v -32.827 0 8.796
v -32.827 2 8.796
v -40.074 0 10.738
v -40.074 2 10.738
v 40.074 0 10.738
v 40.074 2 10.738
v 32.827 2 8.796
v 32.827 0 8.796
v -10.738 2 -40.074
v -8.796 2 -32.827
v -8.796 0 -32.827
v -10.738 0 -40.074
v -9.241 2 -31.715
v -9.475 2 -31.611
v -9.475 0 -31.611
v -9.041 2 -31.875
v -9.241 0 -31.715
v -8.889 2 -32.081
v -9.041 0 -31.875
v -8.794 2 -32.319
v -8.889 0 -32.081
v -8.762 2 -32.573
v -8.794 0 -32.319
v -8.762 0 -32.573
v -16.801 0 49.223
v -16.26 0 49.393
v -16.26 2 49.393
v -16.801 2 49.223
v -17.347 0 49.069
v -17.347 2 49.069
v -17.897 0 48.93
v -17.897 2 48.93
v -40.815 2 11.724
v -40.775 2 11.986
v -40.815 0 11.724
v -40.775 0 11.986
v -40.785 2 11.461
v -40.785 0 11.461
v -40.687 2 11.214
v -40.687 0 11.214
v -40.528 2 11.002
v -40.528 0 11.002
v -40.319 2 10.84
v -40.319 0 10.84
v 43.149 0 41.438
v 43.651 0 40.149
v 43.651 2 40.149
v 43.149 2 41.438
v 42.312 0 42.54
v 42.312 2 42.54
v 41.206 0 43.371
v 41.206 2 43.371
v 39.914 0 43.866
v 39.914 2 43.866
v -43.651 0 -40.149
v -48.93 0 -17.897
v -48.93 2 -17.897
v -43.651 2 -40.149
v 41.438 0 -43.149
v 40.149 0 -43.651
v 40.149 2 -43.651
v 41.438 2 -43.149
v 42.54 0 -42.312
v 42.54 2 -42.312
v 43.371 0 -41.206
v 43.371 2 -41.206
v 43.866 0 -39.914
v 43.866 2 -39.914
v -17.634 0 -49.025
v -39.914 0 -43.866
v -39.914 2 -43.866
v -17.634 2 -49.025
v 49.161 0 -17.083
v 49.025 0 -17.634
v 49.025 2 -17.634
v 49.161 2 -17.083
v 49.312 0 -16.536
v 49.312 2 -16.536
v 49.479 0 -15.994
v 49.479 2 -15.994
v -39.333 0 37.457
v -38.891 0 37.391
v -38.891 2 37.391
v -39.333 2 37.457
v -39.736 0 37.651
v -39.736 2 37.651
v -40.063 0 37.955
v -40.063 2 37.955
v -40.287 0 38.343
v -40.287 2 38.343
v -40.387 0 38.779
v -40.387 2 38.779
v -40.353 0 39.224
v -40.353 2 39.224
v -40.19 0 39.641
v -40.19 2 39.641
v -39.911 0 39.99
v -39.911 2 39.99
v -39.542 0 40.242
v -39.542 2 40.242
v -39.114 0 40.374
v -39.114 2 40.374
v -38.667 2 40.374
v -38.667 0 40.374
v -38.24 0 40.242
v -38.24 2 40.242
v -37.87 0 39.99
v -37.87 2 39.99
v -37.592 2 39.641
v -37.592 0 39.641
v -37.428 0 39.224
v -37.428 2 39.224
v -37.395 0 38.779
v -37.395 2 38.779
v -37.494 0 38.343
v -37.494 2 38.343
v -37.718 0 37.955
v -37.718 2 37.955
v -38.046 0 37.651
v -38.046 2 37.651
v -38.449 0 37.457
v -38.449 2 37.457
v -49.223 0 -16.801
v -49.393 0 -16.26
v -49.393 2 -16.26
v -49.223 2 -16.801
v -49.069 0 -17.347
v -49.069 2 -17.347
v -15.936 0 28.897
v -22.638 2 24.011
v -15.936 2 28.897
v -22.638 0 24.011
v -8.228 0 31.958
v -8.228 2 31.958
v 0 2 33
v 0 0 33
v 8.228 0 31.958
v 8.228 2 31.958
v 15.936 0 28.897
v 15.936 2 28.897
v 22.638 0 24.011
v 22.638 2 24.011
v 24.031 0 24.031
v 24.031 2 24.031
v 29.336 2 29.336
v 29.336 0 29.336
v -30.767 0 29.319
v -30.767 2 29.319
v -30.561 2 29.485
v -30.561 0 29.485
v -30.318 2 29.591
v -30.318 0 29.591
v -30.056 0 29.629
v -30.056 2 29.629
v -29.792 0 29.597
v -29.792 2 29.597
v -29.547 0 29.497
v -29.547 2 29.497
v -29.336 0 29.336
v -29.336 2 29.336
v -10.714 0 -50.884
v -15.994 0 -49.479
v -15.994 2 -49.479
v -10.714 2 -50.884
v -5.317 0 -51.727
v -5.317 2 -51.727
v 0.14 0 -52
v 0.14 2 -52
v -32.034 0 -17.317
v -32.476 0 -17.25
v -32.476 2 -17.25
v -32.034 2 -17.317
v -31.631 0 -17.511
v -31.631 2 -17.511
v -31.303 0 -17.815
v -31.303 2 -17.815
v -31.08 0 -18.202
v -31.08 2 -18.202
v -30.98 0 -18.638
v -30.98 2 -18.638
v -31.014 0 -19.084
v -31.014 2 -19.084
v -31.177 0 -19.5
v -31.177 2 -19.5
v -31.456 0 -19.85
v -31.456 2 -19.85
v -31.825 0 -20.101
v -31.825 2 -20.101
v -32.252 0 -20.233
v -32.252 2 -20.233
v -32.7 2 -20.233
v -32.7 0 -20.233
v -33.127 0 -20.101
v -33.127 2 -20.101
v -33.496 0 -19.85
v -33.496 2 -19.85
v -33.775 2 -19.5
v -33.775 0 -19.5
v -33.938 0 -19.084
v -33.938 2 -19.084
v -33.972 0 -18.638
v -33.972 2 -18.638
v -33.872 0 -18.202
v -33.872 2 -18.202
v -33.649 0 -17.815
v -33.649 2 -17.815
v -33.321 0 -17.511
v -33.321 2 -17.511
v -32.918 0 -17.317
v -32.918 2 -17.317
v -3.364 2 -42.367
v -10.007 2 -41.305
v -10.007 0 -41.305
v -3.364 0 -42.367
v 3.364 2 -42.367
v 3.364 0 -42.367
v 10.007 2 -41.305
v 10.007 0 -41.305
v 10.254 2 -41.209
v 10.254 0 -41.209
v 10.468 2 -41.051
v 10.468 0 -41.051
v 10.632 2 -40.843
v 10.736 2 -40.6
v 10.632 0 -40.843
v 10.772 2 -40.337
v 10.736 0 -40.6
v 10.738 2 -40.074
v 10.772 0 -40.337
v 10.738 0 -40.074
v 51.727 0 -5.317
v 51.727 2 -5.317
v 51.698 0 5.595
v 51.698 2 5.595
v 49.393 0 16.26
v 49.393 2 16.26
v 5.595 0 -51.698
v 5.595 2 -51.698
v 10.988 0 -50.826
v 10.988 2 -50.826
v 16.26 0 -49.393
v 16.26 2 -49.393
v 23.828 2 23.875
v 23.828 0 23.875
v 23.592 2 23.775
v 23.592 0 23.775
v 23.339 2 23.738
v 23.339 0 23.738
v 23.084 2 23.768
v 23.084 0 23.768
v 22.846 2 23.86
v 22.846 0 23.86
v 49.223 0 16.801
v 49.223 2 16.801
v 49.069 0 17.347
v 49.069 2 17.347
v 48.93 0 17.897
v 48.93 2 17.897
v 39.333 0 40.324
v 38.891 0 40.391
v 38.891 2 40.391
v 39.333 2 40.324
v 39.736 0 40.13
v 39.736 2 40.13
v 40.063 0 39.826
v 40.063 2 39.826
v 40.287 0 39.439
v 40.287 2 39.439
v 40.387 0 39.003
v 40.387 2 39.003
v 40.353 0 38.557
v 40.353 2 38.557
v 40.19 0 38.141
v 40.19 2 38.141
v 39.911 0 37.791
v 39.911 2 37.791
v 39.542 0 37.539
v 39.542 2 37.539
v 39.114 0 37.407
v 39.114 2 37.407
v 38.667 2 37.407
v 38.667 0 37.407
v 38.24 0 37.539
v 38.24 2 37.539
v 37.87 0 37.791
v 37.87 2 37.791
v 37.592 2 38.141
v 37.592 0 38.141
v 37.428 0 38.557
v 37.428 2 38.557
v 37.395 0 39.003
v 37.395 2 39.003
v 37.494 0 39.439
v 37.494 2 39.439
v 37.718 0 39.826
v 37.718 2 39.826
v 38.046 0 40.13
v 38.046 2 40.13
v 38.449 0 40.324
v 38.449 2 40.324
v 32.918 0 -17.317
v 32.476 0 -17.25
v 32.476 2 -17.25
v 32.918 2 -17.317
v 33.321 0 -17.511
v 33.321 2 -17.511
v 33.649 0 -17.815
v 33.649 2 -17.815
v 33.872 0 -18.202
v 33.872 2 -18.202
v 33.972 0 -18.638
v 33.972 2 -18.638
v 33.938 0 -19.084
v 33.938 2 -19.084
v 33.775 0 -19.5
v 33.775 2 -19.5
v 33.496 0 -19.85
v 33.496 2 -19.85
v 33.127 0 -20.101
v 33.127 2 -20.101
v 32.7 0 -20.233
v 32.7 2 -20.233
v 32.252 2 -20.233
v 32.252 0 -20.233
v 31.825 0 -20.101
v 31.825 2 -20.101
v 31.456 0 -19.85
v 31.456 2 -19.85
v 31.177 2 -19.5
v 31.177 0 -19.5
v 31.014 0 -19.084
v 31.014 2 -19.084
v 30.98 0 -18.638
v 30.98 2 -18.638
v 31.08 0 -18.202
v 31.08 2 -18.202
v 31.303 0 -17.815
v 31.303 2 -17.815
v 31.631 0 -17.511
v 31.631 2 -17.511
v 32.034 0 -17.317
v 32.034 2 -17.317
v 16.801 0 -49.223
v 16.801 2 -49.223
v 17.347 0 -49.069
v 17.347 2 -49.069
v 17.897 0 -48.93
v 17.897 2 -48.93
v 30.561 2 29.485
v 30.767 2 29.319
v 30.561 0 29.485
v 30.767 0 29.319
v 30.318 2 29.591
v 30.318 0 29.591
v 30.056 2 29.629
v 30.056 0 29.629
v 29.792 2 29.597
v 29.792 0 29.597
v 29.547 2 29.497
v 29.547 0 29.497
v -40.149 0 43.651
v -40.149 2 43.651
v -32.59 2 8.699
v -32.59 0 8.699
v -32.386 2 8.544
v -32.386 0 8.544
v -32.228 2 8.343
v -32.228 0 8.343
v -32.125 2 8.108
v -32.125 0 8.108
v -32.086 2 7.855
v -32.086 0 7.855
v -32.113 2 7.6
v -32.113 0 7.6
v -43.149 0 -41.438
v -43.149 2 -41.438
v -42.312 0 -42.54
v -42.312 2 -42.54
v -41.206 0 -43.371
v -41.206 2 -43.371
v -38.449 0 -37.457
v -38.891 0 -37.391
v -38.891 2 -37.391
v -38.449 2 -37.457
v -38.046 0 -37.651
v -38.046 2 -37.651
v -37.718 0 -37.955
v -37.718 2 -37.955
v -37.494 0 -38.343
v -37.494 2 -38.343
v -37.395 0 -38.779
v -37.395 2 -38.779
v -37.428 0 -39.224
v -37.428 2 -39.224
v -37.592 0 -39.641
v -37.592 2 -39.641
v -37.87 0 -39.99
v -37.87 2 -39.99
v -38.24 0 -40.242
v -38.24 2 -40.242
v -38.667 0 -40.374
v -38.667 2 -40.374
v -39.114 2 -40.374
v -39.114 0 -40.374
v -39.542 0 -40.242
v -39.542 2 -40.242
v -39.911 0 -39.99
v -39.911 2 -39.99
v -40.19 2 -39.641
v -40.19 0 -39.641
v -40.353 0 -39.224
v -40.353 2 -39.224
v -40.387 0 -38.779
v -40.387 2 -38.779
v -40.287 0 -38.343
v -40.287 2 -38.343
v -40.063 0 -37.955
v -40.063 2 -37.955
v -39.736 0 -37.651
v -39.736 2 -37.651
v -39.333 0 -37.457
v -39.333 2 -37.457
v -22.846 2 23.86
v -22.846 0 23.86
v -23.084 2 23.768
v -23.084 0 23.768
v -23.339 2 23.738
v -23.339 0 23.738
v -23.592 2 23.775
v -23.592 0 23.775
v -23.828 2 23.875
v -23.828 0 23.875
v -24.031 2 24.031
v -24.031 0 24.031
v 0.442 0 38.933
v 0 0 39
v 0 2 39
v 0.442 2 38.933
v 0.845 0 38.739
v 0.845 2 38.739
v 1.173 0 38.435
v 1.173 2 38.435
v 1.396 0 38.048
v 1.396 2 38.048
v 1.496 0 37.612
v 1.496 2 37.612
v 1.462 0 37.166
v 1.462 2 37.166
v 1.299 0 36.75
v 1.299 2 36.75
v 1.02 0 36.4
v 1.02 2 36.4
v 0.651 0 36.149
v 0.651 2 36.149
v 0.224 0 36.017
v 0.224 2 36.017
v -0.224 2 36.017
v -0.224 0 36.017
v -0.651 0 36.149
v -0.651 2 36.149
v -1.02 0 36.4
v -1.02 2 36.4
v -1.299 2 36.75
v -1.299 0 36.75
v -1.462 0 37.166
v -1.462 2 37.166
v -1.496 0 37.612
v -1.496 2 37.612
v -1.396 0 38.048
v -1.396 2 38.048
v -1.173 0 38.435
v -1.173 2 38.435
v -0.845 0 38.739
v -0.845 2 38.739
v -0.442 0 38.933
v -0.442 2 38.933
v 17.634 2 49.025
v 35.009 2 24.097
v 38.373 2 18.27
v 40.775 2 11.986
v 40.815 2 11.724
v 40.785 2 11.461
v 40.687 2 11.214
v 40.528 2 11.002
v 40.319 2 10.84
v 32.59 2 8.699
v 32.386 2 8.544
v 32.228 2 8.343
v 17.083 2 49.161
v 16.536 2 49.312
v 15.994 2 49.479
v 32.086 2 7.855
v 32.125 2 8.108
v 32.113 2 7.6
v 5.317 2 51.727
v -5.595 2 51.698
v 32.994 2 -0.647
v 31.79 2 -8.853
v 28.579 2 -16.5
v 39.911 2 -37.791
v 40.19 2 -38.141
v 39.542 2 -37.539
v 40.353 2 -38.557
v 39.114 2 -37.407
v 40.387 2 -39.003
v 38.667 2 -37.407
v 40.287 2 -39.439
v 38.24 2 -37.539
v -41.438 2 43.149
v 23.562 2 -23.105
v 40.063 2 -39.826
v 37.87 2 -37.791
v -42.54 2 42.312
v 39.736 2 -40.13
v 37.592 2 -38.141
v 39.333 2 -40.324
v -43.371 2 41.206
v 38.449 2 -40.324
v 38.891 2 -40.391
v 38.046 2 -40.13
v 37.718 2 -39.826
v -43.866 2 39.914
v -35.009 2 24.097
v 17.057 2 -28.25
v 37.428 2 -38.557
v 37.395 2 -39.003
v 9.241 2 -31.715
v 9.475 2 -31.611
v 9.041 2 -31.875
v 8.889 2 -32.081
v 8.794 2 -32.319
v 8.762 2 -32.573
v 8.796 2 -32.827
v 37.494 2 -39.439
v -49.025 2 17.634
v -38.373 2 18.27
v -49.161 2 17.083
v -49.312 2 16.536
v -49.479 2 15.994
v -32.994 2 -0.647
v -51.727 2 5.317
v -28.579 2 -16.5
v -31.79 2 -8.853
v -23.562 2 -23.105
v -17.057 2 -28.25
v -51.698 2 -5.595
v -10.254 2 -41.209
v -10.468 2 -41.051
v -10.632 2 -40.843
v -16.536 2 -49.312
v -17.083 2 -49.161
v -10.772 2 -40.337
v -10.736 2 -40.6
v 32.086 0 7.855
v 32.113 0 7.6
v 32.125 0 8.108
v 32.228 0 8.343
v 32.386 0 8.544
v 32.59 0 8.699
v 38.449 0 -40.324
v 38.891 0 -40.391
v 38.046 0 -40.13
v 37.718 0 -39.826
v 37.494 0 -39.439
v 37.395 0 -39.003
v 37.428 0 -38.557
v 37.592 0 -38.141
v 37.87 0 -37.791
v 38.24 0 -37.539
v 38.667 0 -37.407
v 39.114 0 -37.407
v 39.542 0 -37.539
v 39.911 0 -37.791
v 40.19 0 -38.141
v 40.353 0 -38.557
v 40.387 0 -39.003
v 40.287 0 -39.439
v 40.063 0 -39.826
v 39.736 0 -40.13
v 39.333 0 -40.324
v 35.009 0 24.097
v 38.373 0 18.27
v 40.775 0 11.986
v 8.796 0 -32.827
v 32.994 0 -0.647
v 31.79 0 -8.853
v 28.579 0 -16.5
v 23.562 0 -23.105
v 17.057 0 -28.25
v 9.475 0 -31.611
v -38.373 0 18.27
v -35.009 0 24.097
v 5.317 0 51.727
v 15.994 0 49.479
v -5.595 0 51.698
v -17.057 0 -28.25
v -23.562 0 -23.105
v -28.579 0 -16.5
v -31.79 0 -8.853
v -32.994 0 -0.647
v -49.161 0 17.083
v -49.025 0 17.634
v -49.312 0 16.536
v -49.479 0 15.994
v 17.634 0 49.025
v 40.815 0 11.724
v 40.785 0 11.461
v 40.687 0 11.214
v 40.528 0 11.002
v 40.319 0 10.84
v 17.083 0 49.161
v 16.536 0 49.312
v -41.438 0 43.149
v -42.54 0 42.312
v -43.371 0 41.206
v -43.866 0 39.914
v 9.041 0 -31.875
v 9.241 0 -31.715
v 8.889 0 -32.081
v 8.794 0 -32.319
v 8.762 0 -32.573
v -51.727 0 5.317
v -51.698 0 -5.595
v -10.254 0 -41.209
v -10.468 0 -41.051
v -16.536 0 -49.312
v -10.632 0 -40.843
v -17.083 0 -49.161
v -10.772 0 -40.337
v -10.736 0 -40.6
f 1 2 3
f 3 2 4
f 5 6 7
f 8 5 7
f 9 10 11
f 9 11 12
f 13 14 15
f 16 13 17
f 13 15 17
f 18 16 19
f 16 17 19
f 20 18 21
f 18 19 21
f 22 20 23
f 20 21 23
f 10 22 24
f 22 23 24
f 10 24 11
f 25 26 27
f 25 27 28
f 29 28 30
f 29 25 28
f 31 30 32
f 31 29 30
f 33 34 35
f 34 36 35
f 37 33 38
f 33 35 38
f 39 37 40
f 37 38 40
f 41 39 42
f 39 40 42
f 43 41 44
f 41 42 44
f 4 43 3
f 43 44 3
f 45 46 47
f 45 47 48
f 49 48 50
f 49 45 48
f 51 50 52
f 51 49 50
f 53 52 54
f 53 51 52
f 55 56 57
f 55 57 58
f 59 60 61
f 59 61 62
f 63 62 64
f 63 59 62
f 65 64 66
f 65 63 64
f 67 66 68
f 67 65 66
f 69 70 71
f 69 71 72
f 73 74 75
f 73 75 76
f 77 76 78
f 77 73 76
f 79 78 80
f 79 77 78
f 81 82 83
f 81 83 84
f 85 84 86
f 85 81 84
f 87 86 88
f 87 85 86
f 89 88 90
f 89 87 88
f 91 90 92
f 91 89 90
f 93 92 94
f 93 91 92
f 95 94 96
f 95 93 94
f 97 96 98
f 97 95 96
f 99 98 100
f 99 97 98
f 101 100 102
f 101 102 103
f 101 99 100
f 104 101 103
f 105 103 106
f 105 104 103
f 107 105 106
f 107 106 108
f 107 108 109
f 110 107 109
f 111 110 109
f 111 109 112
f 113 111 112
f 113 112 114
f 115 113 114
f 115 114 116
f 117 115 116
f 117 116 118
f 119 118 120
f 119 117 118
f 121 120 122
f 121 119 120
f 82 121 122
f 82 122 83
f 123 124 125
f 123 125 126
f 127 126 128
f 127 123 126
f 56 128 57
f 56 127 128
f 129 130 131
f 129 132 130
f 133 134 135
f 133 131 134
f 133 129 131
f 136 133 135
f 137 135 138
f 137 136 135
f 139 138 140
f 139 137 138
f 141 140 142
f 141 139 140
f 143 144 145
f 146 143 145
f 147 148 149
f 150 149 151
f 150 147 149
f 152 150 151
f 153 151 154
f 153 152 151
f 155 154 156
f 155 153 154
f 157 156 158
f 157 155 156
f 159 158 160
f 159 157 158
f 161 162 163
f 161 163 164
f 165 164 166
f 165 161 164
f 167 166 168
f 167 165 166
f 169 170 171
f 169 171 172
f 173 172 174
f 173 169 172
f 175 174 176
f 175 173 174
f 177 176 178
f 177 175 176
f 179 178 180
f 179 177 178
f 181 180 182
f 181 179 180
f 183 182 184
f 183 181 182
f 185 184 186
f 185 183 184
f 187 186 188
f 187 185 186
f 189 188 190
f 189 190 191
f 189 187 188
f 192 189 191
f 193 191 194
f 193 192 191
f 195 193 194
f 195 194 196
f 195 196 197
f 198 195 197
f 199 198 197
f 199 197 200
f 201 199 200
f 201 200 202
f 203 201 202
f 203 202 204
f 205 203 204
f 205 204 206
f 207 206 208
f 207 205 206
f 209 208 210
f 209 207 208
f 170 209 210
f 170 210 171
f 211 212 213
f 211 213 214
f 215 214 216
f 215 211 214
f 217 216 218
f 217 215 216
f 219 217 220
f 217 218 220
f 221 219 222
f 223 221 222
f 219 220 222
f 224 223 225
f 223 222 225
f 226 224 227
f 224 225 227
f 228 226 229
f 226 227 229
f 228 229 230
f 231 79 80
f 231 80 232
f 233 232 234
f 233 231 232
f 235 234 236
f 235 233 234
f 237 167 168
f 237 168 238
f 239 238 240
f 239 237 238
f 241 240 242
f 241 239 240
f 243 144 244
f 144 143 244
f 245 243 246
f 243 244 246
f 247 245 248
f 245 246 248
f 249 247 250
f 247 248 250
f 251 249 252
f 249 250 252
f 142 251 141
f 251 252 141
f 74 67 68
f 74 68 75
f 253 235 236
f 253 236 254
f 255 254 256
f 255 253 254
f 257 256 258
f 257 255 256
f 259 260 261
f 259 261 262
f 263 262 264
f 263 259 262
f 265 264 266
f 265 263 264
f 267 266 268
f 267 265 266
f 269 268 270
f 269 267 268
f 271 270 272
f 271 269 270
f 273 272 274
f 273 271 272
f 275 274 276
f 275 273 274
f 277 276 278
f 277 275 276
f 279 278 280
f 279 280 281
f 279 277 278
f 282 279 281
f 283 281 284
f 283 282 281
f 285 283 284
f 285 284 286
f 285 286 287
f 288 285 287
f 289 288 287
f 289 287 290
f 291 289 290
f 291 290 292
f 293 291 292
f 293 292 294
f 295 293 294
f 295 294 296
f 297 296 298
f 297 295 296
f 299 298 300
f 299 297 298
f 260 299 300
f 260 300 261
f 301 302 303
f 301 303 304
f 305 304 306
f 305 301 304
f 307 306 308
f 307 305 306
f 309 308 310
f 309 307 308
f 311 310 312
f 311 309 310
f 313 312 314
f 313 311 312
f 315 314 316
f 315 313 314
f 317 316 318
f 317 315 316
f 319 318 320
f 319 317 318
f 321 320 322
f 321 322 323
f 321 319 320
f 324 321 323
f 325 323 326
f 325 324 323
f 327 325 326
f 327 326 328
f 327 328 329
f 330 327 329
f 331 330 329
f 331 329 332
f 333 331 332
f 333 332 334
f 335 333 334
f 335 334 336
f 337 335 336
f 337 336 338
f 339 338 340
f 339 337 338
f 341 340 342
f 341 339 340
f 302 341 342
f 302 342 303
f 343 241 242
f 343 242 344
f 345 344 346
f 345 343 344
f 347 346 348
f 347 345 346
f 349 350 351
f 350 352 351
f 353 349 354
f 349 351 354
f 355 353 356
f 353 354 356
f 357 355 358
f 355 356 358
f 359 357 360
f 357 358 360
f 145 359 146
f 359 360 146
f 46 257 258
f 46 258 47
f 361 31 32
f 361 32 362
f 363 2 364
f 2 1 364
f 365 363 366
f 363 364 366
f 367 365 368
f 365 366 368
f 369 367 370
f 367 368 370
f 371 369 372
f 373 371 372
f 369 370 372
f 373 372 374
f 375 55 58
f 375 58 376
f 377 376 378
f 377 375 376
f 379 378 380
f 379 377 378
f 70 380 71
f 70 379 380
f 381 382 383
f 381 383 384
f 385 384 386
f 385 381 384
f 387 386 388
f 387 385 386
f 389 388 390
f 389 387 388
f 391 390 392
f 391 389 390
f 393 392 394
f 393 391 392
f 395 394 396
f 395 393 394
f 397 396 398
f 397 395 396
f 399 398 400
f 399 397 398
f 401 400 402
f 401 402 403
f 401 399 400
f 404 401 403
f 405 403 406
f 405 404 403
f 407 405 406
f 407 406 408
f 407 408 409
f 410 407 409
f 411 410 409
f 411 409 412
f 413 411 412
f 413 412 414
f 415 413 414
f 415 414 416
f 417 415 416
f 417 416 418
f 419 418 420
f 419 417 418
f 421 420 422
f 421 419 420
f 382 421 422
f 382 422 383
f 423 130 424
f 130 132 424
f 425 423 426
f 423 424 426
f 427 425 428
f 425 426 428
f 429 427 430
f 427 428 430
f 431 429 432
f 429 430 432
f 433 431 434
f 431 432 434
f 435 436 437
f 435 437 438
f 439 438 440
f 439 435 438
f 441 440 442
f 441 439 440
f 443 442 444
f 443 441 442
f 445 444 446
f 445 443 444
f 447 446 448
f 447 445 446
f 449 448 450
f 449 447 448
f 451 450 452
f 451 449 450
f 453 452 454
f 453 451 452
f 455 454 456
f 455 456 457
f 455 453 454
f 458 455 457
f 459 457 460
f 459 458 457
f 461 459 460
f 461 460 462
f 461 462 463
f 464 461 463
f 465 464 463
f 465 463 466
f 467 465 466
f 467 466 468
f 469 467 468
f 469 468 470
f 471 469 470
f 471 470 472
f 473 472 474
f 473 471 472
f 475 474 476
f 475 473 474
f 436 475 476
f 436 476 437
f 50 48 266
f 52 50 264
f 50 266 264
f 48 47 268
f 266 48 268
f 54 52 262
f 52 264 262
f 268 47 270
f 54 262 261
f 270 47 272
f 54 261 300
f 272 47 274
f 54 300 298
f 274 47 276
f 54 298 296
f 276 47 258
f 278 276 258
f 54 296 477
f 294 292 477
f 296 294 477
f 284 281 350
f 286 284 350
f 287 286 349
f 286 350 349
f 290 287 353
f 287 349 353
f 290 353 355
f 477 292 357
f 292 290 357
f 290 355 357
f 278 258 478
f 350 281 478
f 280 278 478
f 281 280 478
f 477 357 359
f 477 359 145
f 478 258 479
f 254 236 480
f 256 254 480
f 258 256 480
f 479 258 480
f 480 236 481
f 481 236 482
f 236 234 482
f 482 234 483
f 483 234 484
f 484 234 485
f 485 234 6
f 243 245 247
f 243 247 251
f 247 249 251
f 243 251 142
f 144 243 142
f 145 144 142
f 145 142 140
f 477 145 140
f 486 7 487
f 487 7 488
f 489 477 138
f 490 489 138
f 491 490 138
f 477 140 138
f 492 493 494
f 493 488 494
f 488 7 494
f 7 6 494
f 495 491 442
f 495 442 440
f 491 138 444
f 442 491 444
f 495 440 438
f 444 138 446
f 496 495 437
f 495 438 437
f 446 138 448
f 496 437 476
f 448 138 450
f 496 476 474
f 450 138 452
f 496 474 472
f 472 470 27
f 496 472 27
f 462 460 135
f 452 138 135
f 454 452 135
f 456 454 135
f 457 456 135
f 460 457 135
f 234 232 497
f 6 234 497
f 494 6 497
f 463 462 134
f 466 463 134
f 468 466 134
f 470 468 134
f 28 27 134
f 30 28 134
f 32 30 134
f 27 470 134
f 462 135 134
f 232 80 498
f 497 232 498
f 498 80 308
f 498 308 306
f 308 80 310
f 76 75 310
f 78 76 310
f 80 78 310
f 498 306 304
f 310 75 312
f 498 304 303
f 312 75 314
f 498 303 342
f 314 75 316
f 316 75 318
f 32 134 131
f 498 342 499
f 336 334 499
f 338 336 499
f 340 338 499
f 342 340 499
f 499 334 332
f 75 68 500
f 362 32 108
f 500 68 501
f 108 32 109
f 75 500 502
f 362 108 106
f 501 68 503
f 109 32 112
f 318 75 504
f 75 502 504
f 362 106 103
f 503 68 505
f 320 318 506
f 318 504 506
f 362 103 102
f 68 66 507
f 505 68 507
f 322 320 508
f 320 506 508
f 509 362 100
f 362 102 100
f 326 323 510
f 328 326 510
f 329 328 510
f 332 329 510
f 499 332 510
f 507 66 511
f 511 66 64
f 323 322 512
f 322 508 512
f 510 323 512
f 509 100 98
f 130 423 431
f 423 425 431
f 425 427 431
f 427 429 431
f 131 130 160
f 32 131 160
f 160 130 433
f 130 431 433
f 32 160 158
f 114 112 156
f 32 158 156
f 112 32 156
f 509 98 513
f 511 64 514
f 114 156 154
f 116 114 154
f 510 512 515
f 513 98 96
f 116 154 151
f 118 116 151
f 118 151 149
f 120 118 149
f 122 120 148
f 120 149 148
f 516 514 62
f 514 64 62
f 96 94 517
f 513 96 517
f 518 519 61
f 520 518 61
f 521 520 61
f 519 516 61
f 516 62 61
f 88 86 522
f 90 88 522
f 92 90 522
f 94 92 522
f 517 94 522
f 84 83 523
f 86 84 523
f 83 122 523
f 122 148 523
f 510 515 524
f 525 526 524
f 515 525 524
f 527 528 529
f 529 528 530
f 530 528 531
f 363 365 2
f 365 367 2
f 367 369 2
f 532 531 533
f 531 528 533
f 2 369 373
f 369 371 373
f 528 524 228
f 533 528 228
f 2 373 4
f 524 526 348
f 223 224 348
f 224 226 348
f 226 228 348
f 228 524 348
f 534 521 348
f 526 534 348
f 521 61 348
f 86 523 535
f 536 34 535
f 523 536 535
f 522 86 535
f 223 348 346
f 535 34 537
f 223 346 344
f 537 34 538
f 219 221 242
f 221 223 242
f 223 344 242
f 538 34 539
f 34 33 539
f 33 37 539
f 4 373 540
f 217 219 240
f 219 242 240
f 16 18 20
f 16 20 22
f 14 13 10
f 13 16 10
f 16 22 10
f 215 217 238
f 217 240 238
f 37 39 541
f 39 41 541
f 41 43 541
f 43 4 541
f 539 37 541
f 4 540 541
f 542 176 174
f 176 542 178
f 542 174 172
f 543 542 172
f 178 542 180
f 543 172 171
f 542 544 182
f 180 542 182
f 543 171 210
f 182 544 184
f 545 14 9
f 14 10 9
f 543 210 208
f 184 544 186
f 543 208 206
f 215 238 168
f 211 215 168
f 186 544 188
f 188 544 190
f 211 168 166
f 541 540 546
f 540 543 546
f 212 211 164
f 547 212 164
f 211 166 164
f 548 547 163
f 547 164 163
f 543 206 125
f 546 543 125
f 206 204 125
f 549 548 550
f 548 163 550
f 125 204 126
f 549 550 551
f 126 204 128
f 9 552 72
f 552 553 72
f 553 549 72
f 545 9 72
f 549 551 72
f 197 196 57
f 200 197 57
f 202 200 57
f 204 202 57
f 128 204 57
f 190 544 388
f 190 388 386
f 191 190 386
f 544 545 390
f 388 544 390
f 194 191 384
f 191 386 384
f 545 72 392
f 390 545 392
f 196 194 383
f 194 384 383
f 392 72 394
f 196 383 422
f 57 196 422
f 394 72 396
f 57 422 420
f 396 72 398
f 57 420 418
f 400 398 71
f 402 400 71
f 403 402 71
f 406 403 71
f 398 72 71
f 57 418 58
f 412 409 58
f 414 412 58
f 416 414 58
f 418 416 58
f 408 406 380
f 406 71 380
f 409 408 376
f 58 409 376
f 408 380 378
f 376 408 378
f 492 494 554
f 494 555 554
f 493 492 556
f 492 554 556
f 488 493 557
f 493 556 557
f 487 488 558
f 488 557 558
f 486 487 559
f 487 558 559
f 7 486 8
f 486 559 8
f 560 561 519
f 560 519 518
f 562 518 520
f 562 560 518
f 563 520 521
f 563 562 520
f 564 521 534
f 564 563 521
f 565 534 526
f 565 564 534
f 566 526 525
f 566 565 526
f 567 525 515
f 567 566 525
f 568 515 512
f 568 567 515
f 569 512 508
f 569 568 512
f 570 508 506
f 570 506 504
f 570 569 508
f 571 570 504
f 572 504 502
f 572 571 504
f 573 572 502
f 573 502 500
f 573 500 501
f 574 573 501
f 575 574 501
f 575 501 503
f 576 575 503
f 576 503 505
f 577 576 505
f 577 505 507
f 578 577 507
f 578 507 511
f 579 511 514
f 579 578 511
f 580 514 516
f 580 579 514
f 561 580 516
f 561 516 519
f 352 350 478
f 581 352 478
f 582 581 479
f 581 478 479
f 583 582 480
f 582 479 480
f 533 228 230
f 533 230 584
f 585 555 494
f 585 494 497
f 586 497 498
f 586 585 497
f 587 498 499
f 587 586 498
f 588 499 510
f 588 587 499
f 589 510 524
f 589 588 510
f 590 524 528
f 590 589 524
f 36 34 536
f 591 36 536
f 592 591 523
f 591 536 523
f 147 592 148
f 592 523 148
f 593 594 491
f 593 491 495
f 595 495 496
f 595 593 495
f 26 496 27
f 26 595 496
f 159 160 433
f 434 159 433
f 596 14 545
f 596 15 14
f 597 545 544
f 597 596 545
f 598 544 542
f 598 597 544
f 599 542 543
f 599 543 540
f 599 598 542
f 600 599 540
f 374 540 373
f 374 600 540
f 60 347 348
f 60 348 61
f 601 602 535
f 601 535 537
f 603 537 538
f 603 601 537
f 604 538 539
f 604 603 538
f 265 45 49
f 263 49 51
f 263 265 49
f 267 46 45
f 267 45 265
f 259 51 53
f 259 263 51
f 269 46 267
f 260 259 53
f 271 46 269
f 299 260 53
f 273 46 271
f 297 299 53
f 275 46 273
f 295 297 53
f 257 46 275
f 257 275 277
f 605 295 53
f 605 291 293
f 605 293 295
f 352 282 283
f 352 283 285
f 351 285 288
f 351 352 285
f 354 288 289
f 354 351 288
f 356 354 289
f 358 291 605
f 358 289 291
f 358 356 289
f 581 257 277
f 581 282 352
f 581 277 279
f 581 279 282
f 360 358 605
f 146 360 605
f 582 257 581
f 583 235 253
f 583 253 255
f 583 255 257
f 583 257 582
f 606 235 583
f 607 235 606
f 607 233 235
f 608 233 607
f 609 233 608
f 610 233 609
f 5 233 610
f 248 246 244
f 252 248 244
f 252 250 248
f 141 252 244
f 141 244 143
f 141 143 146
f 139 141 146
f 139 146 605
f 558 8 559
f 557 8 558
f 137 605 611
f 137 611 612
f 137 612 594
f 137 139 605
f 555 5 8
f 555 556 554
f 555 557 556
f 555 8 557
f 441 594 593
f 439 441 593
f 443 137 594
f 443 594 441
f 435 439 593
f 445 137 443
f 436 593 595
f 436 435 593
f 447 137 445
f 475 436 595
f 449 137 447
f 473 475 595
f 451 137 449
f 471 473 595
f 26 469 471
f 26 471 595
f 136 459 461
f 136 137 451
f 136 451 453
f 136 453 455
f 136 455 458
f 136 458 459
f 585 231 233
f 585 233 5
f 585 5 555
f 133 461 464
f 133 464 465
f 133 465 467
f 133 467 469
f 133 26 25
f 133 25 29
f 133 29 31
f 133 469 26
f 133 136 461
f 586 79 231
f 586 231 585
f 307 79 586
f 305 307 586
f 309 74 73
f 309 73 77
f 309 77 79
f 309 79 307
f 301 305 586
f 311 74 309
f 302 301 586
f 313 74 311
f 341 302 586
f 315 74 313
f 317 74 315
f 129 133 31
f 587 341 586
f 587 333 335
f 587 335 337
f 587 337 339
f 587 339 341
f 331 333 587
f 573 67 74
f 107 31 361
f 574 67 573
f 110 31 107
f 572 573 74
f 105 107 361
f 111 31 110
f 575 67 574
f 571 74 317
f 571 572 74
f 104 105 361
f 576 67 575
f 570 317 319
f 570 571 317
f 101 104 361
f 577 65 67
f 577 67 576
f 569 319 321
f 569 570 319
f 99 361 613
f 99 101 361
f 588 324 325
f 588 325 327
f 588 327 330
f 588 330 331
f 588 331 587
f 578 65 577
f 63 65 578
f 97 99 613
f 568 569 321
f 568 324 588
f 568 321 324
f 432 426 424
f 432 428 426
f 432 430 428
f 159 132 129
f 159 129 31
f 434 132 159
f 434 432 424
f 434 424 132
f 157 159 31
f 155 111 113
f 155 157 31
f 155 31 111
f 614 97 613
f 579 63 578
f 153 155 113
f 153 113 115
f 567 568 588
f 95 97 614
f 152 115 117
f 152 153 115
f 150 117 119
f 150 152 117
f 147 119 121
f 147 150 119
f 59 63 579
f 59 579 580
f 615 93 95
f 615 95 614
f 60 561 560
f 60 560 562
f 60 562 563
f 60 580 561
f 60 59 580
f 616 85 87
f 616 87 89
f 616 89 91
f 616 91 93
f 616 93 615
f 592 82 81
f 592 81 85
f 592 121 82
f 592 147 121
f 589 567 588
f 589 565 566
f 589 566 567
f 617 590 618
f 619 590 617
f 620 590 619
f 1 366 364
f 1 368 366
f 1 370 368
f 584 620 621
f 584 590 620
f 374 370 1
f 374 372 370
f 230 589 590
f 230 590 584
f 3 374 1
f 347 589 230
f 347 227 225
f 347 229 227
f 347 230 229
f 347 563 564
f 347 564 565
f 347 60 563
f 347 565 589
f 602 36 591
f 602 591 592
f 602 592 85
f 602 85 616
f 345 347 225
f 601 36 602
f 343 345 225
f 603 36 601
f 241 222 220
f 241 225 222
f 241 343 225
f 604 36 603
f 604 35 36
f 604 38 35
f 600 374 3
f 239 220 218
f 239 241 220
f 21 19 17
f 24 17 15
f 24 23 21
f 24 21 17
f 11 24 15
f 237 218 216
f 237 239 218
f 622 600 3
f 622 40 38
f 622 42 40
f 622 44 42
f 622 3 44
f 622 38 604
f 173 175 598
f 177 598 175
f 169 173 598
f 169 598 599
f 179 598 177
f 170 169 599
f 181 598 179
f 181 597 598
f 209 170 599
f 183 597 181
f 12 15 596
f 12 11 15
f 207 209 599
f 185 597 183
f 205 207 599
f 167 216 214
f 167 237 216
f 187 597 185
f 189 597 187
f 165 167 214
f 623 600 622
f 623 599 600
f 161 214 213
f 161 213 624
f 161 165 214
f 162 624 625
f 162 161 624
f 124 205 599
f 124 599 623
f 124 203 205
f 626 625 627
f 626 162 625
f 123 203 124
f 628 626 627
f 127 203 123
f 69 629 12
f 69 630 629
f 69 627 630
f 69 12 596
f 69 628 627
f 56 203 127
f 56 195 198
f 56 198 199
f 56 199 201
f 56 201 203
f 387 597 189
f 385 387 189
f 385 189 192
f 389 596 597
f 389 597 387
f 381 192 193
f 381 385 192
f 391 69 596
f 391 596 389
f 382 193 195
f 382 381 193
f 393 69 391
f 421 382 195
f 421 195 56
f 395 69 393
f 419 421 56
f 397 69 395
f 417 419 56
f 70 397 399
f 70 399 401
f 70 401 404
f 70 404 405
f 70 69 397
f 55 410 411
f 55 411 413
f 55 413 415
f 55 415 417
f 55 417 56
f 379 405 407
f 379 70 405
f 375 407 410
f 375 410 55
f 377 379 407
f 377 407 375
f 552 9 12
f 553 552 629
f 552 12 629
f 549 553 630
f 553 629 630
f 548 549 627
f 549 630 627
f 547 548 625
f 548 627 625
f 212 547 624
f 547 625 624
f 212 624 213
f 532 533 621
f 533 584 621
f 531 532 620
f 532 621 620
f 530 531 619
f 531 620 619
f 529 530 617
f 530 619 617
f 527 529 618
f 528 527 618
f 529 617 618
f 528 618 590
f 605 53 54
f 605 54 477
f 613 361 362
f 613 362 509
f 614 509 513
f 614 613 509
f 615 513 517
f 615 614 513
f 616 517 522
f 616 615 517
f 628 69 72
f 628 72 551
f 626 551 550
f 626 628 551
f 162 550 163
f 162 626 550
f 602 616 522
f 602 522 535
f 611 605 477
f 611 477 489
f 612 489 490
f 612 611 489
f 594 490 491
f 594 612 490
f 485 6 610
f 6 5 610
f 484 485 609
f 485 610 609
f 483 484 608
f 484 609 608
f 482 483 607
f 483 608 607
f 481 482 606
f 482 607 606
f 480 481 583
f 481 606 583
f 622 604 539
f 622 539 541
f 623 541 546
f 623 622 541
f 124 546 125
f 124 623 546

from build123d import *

# Parameters (mm, degrees)
SKETCH1_R           = 1.5
SKETCH1_R_2         = 33
BOSS_EXTRUDE1_DEPTH = 2
CUT_EXTRUDE1_DEPTH  = 74.566296631
FILLET1_R           = 1


with BuildPart() as part:
    # Sketch1 → Boss-Extrude1 (new body)
    with BuildSketch(Plane(origin=(0, 0, 0), x_dir=(1, 0, 0), z_dir=(0, 1, 0))):
        with BuildLine():
            Line((17.897079586, 48.929734976), (40.149284407, 43.651218265))
            ThreePointArc((40.149284407, 43.651218265), (42.540265174, 42.312242187), (43.866371506, 39.91409958))
            Line((43.866371506, 39.91409958), (49.02521675, 17.633846579))
            ThreePointArc((49.02521675, 17.633846579), (49.23478351, 16.809026698), (49.479249782, 15.993868858))
            ThreePointArc((49.479249782, 15.993868858), (51.999812242, -0.139738387), (49.392575566, -16.259565766))
            ThreePointArc((49.392575566, -16.259565766), (49.143731732, -17.073397941), (48.929734976, -17.897079586))
            Line((48.929734976, -17.897079586), (43.651218265, -40.149284407))
            ThreePointArc((43.651218265, -40.149284407), (42.312242187, -42.540265174), (39.91409958, -43.866371506))
            Line((39.91409958, -43.866371506), (17.633846579, -49.02521675))
            ThreePointArc((17.633846579, -49.02521675), (16.809026698, -49.23478351), (15.993868858, -49.479249782))
            ThreePointArc((15.993868858, -49.479249782), (-0.139738387, -51.999812242), (-16.259565766, -49.392575566))
            ThreePointArc((-16.259565766, -49.392575566), (-17.073397941, -49.143731732), (-17.897079586, -48.929734976))
            Line((-17.897079586, -48.929734976), (-40.149284407, -43.651218265))
            ThreePointArc((-40.149284407, -43.651218265), (-42.540265174, -42.312242187), (-43.866371506, -39.91409958))
            Line((-43.866371506, -39.91409958), (-49.02521675, -17.633846579))
            ThreePointArc((-49.02521675, -17.633846579), (-49.23478351, -16.809026698), (-49.479249782, -15.993868858))
            ThreePointArc((-49.479249782, -15.993868858), (-51.999812242, 0.139738387), (-49.392575566, 16.259565766))
            ThreePointArc((-49.392575566, 16.259565766), (-49.143731732, 17.073397941), (-48.929734976, 17.897079586))
            Line((-48.929734976, 17.897079586), (-43.651218265, 40.149284407))
            ThreePointArc((-43.651218265, 40.149284407), (-42.312242187, 42.540265174), (-39.91409958, 43.866371506))
            Line((-39.91409958, 43.866371506), (-17.633846579, 49.02521675))
            ThreePointArc((-17.633846579, 49.02521675), (-16.809026698, 49.23478351), (-15.993868858, 49.479249782))
            ThreePointArc((-15.993868858, 49.479249782), (-8.026622704, 51.3767781), (0.139738387, 51.999812242))
            ThreePointArc((0.139738387, 51.999812242), (8.302633013, 51.332896714), (16.259565766, 49.392575566))
            ThreePointArc((16.259565766, 49.392575566), (17.073397941, 49.143731732), (17.897079586, 48.929734976))
        make_face()
        with Locations(Location((-38.8907, 38.8907, 0), (0, 0, 270))):
            Circle(SKETCH1_R, mode=Mode.SUBTRACT)
        with Locations(Location((38.8907, 38.8907, 0), (0, 0, 90))):
            Circle(SKETCH1_R, mode=Mode.SUBTRACT)
        with Locations(Location((38.8907, -38.8907, 0), (0, 0, 270))):
            Circle(SKETCH1_R, mode=Mode.SUBTRACT)
        with Locations(Location((-38.8907, -38.8907, 0), (0, 0, 90))):
            Circle(SKETCH1_R, mode=Mode.SUBTRACT)
        with Locations(Location((0, 0, 0), (0, 0, 270))):
            Circle(SKETCH1_R_2, mode=Mode.SUBTRACT)
        with Locations(Location((-32.475952642, 18.75, 0), (0, 0, 270))):
            Circle(SKETCH1_R, mode=Mode.SUBTRACT)
        with Locations(Location((0, -37.5, 0), (0, 0, 270))):
            Circle(SKETCH1_R, mode=Mode.SUBTRACT)
        with Locations(Location((32.475952642, 18.75, 0), (0, 0, 270))):
            Circle(SKETCH1_R, mode=Mode.SUBTRACT)
    extrude(amount=BOSS_EXTRUDE1_DEPTH)

    # Sketch2 → Cut-Extrude1 (cut, through all)
    with BuildSketch(Plane(origin=(0, 2, 0), x_dir=(1, 0, 0), z_dir=(0, 1, 0))):
        with BuildLine():
            Line((-8.541028488, 31.875552268), (-10.999809417, 41.051847617))
            ThreePointArc((-10.999809417, 41.051847617), (0, 42.5), (10.999809417, 41.051847617))
            Line((10.999809417, 41.051847617), (8.541028488, 31.875552268))
            ThreePointArc((8.541028488, 31.875552268), (0, 33), (-8.541028488, 31.875552268))
        make_face()
        with BuildLine():
            Line((-31.875552268, -8.541028488), (-41.051847617, -10.999809417))
            ThreePointArc((-41.051847617, -10.999809417), (-36.806079661, -21.25), (-30.0520382, -30.0520382))
            Line((-30.0520382, -30.0520382), (-23.334523779, -23.334523779))
            ThreePointArc((-23.334523779, -23.334523779), (-28.578838325, -16.5), (-31.875552268, -8.541028488))
        make_face()
        with BuildLine():
            Line((23.334523779, -23.334523779), (30.0520382, -30.0520382))
            ThreePointArc((30.0520382, -30.0520382), (36.806079661, -21.25), (41.051847617, -10.999809417))
            Line((41.051847617, -10.999809417), (31.875552268, -8.541028488))
            ThreePointArc((31.875552268, -8.541028488), (28.578838325, -16.5), (23.334523779, -23.334523779))
        make_face()
    extrude(amount=-CUT_EXTRUDE1_DEPTH, mode=Mode.SUBTRACT)

    # Fillet1
    fillet1_edges = [part.edges().sort_by_distance(p)[0] for p in [
        (8.541028488, 1, -31.875552268),
        (-8.541028488, 1, -31.875552268),
        (-10.999809417, 1, -41.051847617),
        (10.999809417, 1, -41.051847617),
        (-31.875552268, 1, 8.541028488),
        (-23.334523779, 1, 23.334523779),
        (-30.0520382, 1, 30.0520382),
        (-41.051847617, 1, 10.999809417),
        (23.334523779, 1, 23.334523779),
        (31.875552268, 1, 8.541028488),
        (41.051847617, 1, 10.999809417),
        (30.0520382, 1, 30.0520382),
    ]]
    fillet(fillet1_edges, radius=FILLET1_R)


solid = part.part
